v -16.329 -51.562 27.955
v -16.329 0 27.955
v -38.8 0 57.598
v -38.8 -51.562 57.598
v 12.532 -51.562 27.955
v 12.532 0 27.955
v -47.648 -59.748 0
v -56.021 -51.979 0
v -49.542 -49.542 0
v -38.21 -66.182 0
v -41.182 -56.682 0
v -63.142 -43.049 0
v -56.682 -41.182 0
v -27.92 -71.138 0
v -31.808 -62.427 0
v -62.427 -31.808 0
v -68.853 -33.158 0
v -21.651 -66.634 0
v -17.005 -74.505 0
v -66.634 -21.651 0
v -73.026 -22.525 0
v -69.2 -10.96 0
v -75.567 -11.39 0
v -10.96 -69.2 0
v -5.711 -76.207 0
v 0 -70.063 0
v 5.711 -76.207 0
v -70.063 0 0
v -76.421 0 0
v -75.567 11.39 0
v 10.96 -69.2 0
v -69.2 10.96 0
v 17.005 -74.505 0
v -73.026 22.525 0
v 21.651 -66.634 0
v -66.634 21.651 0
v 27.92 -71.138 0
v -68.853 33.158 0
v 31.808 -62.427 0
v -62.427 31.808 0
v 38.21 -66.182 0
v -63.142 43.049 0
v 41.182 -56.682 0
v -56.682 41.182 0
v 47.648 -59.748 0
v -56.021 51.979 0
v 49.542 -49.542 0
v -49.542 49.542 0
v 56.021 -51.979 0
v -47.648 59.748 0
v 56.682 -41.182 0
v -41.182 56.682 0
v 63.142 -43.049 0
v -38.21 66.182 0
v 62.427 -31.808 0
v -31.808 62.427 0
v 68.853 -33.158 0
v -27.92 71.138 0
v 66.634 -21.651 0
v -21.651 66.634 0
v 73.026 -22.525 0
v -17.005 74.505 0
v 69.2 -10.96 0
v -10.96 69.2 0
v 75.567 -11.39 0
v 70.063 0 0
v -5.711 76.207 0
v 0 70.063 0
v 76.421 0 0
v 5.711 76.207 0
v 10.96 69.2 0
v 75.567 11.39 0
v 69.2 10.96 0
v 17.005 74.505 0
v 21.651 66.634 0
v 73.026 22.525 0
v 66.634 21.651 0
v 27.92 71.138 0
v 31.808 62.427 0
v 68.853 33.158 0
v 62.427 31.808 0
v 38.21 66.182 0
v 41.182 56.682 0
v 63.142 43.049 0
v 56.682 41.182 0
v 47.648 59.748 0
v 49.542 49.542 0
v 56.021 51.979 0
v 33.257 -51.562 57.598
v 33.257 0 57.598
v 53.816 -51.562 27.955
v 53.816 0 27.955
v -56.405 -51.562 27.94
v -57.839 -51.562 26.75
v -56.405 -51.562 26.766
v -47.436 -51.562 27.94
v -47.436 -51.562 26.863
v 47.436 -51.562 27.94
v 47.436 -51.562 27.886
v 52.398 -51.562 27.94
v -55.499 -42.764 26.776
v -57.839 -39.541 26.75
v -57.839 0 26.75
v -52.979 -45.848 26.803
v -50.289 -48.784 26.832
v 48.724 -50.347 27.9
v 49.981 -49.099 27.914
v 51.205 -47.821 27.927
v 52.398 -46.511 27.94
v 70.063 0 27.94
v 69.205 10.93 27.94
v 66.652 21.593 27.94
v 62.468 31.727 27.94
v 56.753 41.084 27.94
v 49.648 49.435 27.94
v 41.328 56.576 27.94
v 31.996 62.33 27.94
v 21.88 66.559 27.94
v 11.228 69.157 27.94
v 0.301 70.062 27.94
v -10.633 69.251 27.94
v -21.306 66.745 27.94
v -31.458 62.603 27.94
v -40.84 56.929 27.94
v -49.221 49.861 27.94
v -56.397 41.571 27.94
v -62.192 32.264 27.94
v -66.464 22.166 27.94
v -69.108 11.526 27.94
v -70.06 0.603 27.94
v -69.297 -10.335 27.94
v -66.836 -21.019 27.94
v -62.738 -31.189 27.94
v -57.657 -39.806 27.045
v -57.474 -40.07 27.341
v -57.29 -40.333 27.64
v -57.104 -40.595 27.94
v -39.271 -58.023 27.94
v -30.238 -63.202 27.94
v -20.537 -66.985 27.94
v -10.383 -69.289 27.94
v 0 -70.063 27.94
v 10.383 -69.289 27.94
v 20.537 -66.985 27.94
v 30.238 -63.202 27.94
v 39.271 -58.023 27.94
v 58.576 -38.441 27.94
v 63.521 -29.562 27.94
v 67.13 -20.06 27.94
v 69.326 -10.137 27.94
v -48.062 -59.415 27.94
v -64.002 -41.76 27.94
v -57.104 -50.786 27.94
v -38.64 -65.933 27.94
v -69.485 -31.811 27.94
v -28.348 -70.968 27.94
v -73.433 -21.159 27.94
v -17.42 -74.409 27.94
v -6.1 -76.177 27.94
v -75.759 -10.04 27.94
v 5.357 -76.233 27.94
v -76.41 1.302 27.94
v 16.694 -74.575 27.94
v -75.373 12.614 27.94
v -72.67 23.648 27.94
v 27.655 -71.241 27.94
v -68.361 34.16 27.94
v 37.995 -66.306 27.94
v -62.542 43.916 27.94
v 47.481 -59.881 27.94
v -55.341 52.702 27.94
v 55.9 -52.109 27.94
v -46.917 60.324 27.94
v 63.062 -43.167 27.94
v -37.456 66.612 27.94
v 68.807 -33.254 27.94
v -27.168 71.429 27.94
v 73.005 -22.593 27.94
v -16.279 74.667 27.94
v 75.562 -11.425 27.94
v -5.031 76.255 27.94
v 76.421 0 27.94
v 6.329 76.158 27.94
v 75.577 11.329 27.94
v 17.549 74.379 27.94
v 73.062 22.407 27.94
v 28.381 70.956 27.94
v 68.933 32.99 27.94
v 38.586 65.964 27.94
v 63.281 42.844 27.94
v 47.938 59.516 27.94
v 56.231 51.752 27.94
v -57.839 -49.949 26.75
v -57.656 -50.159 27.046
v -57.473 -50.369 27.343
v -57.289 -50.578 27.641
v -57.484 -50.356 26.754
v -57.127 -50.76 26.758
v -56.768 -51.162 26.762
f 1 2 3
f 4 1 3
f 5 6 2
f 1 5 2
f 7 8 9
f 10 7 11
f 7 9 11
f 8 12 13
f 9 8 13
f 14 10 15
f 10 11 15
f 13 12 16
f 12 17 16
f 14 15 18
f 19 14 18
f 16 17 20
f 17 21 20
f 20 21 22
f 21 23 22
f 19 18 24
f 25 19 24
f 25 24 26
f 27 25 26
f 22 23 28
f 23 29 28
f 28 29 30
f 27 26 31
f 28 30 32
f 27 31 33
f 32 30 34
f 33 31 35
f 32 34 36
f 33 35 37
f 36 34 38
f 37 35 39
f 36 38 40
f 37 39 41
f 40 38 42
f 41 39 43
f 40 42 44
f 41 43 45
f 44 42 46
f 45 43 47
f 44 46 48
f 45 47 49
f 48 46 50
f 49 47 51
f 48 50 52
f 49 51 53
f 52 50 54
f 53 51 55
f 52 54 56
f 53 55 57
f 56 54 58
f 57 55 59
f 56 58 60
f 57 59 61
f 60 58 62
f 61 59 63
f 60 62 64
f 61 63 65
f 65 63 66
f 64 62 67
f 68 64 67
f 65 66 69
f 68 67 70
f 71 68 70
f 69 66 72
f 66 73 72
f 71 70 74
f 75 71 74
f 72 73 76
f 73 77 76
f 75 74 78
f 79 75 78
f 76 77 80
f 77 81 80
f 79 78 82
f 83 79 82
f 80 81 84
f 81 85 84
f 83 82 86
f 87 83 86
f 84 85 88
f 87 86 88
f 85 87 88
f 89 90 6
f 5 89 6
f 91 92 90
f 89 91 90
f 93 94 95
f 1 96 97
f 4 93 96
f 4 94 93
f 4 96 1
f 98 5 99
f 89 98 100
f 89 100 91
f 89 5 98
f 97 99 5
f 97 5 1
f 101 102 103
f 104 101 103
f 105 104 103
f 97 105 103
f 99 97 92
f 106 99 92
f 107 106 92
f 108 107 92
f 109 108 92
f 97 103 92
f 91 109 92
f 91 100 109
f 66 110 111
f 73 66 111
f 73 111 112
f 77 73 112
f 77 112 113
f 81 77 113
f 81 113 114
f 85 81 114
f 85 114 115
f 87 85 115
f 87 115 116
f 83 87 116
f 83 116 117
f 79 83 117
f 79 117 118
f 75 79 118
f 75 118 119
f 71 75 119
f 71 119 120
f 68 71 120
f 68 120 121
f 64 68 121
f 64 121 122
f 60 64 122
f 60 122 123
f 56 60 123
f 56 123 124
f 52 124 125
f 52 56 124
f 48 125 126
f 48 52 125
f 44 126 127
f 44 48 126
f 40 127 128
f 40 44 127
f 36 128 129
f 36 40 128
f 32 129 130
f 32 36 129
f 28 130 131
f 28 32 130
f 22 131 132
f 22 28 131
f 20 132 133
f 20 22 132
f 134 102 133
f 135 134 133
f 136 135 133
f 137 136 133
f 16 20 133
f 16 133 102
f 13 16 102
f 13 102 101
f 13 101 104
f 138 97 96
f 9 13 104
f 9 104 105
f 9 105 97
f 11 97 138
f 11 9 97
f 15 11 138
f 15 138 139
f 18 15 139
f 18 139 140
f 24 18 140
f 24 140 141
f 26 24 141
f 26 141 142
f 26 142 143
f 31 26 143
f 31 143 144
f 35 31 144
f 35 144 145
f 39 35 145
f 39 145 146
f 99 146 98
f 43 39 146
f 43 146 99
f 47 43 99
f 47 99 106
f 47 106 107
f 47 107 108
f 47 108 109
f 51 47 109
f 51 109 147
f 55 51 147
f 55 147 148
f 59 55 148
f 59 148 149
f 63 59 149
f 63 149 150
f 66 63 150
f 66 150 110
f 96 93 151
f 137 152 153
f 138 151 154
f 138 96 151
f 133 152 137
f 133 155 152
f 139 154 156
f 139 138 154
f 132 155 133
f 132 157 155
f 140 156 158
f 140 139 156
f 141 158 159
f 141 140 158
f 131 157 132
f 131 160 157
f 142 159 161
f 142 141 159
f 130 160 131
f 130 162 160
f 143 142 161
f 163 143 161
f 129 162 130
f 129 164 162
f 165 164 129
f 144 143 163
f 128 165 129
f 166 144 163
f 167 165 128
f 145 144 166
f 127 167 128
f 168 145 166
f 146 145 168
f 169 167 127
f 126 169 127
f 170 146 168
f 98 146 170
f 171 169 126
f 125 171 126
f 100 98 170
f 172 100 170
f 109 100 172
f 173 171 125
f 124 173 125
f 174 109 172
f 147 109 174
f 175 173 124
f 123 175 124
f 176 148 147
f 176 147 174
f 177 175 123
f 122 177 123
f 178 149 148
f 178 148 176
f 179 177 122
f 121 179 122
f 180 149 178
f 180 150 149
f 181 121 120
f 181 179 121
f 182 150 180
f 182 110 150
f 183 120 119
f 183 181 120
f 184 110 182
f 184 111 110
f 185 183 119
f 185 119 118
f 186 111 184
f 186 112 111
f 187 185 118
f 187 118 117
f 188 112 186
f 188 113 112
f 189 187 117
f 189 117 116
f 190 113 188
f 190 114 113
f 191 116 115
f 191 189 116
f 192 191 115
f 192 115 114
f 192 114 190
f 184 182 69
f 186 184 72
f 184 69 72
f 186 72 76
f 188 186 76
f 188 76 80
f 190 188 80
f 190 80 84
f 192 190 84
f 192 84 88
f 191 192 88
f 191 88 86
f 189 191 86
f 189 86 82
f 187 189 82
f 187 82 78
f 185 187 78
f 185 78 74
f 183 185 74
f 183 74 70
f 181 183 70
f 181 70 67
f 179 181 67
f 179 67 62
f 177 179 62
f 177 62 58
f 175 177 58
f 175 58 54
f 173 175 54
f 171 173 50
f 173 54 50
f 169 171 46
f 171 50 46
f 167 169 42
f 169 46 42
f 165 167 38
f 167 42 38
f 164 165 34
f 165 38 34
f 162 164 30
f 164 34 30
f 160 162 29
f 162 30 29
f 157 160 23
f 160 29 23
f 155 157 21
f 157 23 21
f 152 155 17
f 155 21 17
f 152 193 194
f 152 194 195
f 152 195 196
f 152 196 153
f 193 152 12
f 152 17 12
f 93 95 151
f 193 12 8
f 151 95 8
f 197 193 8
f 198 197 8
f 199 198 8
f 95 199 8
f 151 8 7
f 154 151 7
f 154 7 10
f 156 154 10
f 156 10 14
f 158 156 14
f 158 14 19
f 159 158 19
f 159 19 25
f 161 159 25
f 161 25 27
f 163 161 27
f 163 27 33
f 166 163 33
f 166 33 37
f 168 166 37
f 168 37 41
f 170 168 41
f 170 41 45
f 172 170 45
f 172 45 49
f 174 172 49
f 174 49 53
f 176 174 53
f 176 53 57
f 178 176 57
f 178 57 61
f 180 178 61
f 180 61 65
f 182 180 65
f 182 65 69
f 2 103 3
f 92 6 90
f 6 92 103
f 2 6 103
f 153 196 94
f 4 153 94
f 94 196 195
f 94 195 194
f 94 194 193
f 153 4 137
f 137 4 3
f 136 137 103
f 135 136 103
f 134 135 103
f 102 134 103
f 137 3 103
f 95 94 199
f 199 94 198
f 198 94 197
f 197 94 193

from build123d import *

# Parameters (mm, degrees)
F0_R     = 76.420931
F0_R_2   = 70.062958
F1_DEPTH = 27.94
F3_DEPTH = 51.562


with BuildPart() as f1:
    # F0 (on Top) → F1 (new body)
    with BuildSketch(Plane.XY):
        Circle(F0_R)
        Circle(F0_R_2, mode=Mode.SUBTRACT)
    extrude(amount=F1_DEPTH)

    # F2 (on Front) → F3 (join)
    with BuildSketch(Plane.XZ):
        Polygon((-38.800031, 57.597559), (-57.838555, 26.750332), (53.81551, 27.955303), (33.257172, 57.597559), (12.531687, 27.955303), (-16.329287, 27.955303), align=None)
    extrude(amount=F3_DEPTH)


solid = f1.part
